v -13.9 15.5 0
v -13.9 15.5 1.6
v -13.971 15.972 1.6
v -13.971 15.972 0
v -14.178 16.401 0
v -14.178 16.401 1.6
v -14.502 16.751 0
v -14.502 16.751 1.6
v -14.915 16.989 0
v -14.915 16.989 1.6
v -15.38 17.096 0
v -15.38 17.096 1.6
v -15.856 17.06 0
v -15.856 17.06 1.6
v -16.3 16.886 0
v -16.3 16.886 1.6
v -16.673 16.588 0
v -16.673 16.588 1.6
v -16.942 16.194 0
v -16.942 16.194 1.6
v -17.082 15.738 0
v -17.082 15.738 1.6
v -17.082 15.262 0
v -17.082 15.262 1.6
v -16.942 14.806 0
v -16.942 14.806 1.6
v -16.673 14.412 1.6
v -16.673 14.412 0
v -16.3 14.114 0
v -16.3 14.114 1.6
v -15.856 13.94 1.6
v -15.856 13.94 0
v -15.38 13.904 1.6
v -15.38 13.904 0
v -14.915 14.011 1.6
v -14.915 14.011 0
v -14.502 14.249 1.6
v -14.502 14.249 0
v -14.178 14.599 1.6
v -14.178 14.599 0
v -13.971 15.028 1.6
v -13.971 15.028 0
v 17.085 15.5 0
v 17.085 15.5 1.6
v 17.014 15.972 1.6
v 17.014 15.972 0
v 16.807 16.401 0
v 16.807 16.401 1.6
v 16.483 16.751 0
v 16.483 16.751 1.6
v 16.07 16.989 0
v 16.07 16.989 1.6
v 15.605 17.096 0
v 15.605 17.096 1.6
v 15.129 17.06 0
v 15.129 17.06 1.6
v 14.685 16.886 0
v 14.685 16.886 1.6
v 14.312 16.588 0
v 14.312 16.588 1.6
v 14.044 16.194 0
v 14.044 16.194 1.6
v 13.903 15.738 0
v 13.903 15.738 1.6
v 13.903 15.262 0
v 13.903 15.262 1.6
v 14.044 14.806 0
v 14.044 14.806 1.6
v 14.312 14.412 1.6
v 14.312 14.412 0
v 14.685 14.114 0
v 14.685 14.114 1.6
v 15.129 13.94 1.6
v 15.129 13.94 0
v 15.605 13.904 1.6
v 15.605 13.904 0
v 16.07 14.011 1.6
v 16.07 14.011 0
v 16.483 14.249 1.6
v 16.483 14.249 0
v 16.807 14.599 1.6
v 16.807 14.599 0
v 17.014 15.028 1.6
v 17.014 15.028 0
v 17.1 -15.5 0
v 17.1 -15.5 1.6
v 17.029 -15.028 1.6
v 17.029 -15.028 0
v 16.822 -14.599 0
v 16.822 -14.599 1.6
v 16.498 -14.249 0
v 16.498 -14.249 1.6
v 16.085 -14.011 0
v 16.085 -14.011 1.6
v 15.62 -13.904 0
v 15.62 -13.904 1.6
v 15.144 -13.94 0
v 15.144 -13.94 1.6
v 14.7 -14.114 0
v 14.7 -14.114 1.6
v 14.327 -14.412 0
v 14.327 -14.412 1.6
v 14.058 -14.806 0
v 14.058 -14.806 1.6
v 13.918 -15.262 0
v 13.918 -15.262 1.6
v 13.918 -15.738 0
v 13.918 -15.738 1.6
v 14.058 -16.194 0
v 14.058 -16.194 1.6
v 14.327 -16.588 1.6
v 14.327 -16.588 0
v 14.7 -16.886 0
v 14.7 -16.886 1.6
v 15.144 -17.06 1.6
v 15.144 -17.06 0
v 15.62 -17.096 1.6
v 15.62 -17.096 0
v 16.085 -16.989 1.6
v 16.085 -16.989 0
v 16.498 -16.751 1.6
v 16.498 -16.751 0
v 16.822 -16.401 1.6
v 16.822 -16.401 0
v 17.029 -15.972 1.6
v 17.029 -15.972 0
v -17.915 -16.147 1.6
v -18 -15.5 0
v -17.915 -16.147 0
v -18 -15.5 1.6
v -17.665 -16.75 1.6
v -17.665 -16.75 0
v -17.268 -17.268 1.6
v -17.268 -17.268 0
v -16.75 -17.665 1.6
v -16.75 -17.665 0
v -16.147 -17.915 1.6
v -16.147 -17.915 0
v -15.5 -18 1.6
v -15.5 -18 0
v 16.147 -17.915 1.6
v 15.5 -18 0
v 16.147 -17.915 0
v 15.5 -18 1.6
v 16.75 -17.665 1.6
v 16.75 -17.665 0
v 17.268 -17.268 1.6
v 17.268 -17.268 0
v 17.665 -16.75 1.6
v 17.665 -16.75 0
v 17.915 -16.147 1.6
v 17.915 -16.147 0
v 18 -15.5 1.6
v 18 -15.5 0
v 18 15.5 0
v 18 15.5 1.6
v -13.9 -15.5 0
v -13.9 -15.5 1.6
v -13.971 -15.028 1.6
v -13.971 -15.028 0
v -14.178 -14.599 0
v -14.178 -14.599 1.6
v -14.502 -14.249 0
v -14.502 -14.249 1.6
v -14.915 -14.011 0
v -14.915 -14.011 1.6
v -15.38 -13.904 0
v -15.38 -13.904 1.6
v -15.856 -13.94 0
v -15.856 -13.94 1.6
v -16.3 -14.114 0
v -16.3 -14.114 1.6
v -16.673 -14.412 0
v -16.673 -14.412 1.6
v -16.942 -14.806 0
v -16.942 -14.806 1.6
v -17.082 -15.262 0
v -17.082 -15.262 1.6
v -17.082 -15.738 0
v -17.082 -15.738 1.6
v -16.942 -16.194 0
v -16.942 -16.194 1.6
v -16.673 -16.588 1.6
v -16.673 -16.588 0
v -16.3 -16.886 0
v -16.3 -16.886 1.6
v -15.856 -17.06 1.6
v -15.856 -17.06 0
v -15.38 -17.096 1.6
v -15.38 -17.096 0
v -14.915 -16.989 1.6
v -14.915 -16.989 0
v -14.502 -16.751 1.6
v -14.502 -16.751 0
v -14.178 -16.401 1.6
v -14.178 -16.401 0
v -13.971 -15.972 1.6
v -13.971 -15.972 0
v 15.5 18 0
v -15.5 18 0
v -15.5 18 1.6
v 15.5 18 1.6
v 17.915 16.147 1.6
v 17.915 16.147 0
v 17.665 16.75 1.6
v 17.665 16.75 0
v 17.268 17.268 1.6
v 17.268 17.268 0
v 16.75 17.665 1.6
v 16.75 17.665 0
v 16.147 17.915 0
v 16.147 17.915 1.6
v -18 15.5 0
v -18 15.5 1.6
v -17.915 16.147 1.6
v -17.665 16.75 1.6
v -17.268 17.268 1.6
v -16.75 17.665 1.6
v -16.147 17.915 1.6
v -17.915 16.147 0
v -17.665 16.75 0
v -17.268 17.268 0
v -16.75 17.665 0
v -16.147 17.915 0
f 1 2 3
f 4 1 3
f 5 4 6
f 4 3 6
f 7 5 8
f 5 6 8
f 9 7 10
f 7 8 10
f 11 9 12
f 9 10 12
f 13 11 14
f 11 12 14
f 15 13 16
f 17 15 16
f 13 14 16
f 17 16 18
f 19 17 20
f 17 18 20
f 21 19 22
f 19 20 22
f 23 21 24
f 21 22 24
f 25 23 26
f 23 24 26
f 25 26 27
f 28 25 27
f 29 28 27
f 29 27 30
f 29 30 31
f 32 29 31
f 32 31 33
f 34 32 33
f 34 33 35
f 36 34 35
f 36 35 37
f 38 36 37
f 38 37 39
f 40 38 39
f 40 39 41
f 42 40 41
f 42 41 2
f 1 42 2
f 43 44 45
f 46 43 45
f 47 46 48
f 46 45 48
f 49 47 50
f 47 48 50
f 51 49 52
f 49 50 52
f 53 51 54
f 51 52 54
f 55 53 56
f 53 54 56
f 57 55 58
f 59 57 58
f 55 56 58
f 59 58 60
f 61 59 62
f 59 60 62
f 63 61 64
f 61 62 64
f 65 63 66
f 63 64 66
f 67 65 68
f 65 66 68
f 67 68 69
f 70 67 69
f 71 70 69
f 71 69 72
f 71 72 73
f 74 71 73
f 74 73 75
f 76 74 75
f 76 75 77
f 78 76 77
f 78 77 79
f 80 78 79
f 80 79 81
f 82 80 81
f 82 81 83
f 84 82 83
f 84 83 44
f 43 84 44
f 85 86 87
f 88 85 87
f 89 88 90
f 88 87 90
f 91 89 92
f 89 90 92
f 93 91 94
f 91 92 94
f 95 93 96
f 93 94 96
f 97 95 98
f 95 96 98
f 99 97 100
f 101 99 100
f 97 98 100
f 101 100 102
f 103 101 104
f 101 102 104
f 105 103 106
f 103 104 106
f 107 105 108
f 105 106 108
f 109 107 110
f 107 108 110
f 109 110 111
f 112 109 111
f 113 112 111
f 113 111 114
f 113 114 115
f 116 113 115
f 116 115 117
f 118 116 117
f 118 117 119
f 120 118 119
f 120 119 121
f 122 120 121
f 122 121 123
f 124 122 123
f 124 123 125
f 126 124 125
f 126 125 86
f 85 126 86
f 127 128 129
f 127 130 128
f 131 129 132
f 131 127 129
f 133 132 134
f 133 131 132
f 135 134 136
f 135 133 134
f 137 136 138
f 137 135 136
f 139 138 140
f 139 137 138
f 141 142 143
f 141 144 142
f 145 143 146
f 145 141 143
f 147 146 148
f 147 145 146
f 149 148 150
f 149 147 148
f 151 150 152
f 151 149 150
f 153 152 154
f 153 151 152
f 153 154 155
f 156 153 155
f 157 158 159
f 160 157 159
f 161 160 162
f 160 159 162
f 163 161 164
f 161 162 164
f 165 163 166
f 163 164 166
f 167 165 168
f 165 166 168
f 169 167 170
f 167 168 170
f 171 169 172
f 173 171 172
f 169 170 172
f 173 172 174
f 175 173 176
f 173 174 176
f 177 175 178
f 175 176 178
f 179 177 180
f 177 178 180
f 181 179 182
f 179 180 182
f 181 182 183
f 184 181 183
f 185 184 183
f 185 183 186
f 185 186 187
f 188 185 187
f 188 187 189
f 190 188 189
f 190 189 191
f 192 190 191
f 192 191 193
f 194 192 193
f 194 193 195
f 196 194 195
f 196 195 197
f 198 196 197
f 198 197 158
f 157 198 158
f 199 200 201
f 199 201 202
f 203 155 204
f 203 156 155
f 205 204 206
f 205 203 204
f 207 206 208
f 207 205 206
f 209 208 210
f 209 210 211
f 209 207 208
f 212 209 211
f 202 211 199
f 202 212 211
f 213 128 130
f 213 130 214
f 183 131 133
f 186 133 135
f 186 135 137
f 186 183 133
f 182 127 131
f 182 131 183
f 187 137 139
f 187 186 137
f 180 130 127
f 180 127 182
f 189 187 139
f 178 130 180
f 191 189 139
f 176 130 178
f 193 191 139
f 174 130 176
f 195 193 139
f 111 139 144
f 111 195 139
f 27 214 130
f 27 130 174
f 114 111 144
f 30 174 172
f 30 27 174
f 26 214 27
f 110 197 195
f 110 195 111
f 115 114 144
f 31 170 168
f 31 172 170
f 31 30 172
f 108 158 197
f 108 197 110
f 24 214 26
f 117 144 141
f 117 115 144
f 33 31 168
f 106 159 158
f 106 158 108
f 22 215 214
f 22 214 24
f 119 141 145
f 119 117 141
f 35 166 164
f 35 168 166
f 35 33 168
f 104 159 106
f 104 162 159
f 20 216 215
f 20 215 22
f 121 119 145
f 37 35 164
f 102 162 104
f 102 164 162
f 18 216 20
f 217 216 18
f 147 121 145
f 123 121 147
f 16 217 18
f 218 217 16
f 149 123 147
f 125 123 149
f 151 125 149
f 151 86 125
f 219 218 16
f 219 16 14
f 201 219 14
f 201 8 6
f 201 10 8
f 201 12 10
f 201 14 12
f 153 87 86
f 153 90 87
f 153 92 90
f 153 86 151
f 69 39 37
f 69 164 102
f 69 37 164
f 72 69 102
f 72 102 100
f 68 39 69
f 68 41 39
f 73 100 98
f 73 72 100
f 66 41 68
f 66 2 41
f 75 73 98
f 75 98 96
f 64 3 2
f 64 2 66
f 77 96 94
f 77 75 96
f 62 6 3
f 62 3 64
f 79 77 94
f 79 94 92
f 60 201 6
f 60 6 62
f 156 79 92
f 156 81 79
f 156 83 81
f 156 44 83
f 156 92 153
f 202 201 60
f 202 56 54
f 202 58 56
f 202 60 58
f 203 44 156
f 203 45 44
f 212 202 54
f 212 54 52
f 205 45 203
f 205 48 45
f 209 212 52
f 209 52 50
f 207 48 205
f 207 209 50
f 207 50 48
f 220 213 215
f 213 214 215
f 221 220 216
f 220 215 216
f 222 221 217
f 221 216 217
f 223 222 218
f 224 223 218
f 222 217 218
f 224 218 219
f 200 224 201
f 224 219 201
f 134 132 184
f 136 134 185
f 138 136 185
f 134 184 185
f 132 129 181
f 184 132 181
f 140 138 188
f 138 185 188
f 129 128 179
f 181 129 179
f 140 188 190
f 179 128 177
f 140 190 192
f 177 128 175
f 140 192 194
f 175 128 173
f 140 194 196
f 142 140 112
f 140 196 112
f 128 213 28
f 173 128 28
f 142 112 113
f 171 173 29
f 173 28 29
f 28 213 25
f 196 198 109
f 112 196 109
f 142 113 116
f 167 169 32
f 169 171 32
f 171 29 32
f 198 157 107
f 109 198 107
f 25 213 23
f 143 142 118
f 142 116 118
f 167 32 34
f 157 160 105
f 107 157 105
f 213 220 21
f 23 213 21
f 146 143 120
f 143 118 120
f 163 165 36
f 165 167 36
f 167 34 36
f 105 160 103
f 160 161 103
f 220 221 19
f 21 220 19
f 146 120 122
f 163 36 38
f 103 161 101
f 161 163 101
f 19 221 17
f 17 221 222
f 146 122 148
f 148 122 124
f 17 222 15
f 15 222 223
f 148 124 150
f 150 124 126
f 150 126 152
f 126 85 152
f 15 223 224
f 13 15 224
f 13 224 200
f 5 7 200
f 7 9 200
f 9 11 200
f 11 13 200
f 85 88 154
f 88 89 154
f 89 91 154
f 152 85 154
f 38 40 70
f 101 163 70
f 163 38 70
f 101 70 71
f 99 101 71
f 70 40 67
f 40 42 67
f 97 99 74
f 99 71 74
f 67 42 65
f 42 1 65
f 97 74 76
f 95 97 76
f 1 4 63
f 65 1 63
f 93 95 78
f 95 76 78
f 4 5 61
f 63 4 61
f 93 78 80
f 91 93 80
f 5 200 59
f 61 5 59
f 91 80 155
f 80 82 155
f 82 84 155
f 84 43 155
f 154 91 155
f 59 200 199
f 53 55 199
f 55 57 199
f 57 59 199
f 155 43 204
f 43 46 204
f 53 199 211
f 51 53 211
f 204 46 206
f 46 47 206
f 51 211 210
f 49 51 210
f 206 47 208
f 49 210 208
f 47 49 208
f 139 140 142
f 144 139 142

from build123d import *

# Parameters (mm, degrees)
SKETCH2_W           = 36
SKETCH2_H           = 36
BOSS_EXTRUDE1_DEPTH = 1.6
FILLET1_R           = 2.5
CUT_EXTRUDE1_REACH  = 27.506
SKETCH3_R           = 1.6


with BuildPart() as part:
    # Sketch2 → Boss-Extrude1 (new body)
    with BuildSketch(Plane.XY):
        Rectangle(SKETCH2_W, SKETCH2_H)
    extrude(amount=BOSS_EXTRUDE1_DEPTH)

    # Fillet1
    fillet1_edges = [part.edges().sort_by_distance(p)[0] for p in [
        (-18, 18, 0.8),
        (18, 18, 0.8),
        (18, -18, 0.8),
        (-18, -18, 0.8),
    ]]
    fillet(fillet1_edges, radius=FILLET1_R)

    # Sketch3 → Cut-Extrude1 (cut, up to next)
    with BuildSketch(Plane.XY.offset(1.6), mode=Mode.PRIVATE) as cut_extrude1_sk1:
        with Locations((-15.5, -15.5)):
            Circle(SKETCH3_R)
    cut_extrude1_tool1 = extrude(cut_extrude1_sk1.sketch, amount=-CUT_EXTRUDE1_REACH, mode=Mode.PRIVATE) & part.part
    # Sketch3 → Cut-Extrude1 (cut, up to next)
    with BuildSketch(Plane.XY.offset(1.6), mode=Mode.PRIVATE) as cut_extrude1_sk2:
        with Locations((-15.5, 15.5)):
            Circle(SKETCH3_R)
    cut_extrude1_tool2 = extrude(cut_extrude1_sk2.sketch, amount=-CUT_EXTRUDE1_REACH, mode=Mode.PRIVATE) & part.part
    # Sketch3 → Cut-Extrude1 (cut, up to next)
    with BuildSketch(Plane.XY.offset(1.6), mode=Mode.PRIVATE) as cut_extrude1_sk3:
        with Locations((15.48525874, 15.5)):
            Circle(SKETCH3_R)
    cut_extrude1_tool3 = extrude(cut_extrude1_sk3.sketch, amount=-CUT_EXTRUDE1_REACH, mode=Mode.PRIVATE) & part.part
    # Sketch3 → Cut-Extrude1 (cut, up to next)
    with BuildSketch(Plane.XY.offset(1.6), mode=Mode.PRIVATE) as cut_extrude1_sk4:
        with Locations((15.5, -15.5)):
            Circle(SKETCH3_R)
    cut_extrude1_tool4 = extrude(cut_extrude1_sk4.sketch, amount=-CUT_EXTRUDE1_REACH, mode=Mode.PRIVATE) & part.part
    add(cut_extrude1_tool1.solids().sort_by_distance((-15.5, -15.5, 1.6))[0], mode=Mode.SUBTRACT)
    add(cut_extrude1_tool2.solids().sort_by_distance((-15.5, 15.5, 1.6))[0], mode=Mode.SUBTRACT)
    add(cut_extrude1_tool3.solids().sort_by_distance((15.485259, 15.5, 1.6))[0], mode=Mode.SUBTRACT)
    add(cut_extrude1_tool4.solids().sort_by_distance((15.5, -15.5, 1.6))[0], mode=Mode.SUBTRACT)


solid = part.part
